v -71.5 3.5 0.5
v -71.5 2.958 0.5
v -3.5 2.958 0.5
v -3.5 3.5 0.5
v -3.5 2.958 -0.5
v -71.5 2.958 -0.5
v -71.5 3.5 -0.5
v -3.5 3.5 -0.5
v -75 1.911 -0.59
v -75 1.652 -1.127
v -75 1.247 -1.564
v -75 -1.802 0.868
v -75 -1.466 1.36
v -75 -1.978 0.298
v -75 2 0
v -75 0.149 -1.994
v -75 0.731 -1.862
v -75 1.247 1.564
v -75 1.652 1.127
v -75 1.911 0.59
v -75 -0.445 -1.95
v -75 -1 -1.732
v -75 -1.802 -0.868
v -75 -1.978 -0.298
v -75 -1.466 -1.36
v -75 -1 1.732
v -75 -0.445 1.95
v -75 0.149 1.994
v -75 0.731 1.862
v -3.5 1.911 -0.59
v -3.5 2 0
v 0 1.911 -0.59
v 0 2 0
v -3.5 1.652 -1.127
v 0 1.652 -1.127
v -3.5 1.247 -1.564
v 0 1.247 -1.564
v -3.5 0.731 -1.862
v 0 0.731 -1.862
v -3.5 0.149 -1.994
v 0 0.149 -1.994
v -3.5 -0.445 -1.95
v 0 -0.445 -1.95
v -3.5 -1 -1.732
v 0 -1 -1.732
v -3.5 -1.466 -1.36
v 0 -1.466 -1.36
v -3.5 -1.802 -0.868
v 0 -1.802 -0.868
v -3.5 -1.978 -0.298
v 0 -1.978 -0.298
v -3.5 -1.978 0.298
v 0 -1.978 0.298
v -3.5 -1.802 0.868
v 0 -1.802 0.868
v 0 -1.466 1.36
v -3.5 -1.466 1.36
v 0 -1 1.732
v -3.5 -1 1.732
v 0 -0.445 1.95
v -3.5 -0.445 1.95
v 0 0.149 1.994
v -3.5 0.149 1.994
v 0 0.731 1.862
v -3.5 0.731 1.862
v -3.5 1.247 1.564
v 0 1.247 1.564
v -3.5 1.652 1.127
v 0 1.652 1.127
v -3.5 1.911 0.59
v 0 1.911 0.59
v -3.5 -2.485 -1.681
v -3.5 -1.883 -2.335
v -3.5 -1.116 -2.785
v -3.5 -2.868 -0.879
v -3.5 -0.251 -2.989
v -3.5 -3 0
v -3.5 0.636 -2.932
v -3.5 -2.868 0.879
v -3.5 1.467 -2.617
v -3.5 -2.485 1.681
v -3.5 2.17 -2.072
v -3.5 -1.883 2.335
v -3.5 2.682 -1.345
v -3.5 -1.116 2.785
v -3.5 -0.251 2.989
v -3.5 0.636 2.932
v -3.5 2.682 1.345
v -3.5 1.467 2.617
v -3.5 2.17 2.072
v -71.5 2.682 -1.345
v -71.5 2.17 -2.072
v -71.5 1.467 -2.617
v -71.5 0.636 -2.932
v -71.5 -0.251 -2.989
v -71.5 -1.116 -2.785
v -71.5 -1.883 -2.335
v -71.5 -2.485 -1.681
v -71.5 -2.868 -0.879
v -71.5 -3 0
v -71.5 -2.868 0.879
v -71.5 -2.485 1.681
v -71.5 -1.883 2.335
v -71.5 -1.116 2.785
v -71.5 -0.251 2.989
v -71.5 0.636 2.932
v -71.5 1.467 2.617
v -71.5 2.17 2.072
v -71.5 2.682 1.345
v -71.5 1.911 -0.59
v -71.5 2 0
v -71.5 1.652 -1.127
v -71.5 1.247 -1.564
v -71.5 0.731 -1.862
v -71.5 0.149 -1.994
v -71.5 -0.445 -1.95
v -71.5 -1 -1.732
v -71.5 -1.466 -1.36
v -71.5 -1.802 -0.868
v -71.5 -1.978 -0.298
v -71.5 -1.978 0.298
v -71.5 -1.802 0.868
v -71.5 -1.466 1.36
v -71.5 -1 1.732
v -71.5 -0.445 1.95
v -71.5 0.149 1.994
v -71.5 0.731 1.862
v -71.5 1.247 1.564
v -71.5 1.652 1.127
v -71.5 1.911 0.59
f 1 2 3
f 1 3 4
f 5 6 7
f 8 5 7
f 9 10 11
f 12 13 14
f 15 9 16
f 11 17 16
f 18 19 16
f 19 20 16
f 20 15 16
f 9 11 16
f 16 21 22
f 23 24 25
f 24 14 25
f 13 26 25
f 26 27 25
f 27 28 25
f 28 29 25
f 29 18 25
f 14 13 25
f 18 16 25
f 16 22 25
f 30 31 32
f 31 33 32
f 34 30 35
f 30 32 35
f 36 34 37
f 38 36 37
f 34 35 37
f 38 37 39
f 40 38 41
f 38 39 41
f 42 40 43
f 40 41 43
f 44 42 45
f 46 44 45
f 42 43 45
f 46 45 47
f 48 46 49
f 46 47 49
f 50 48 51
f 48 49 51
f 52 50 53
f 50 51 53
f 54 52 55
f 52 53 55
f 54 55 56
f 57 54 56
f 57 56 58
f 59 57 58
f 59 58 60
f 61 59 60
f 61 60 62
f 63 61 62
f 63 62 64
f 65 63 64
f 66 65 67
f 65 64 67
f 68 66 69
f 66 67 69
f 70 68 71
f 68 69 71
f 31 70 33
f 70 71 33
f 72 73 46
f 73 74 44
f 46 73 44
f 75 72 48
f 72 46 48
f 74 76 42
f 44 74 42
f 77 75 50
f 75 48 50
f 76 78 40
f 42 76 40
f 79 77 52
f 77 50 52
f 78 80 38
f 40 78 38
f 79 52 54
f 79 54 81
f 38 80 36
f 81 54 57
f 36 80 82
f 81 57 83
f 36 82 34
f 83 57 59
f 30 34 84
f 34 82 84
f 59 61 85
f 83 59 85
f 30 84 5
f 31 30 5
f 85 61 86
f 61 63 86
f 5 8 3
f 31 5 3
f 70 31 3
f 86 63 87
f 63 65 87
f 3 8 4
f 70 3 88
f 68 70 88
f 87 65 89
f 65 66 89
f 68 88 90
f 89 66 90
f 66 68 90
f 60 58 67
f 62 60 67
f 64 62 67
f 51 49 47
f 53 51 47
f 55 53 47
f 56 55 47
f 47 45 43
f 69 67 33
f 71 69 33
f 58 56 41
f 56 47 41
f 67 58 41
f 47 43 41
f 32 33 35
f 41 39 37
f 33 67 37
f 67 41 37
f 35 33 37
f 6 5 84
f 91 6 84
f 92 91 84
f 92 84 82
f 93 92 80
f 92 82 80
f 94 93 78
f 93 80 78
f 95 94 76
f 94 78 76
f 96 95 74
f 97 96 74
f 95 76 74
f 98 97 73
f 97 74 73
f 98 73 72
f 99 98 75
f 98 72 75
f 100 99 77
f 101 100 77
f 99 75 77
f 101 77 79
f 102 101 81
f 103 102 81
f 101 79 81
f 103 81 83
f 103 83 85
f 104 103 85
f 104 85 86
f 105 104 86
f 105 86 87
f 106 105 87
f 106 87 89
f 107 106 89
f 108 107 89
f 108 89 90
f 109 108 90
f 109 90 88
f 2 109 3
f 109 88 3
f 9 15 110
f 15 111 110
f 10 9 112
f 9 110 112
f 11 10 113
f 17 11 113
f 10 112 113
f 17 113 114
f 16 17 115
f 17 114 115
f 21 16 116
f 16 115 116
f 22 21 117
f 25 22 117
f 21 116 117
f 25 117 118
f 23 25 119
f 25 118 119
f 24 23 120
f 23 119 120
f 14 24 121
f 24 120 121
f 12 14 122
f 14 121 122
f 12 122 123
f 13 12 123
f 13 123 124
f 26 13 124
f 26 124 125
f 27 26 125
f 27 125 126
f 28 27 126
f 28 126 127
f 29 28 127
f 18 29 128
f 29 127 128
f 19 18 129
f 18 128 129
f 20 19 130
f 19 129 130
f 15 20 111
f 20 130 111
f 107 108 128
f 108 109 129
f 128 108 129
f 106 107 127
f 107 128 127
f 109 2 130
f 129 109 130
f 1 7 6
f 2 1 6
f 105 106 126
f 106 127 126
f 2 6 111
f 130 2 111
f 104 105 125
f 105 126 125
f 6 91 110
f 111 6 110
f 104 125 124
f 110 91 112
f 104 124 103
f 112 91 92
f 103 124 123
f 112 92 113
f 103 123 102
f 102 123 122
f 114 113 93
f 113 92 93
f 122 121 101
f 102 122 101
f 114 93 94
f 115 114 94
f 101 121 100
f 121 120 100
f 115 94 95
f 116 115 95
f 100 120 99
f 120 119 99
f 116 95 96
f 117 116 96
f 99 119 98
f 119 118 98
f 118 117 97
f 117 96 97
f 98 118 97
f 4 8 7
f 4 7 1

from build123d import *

# Parameters (mm, degrees)
SKETCH2_W           = 1
SKETCH2_H           = 1
BOSS_EXTRUDE1_DEPTH = 68


with BuildPart() as part:
    # Sketch1 → Revolve1 (revolve)
    with BuildSketch(Plane.XY):
        Polygon((0, 0), (-75, 0), (-75, 2), (-71.5, 2), (-71.5, 3), (-3.5, 3), (-3.5, 2), (0, 2), align=None)
    revolve(axis=Axis((0, 0, 0), (-1, 0, 0)))

    # Sketch2 → Boss-Extrude1 (add)
    with BuildSketch(Plane.ZY.offset(71.5)):
        with Locations((0, 3)):
            Rectangle(SKETCH2_W, SKETCH2_H)
    extrude(amount=-BOSS_EXTRUDE1_DEPTH)


solid = part.part
